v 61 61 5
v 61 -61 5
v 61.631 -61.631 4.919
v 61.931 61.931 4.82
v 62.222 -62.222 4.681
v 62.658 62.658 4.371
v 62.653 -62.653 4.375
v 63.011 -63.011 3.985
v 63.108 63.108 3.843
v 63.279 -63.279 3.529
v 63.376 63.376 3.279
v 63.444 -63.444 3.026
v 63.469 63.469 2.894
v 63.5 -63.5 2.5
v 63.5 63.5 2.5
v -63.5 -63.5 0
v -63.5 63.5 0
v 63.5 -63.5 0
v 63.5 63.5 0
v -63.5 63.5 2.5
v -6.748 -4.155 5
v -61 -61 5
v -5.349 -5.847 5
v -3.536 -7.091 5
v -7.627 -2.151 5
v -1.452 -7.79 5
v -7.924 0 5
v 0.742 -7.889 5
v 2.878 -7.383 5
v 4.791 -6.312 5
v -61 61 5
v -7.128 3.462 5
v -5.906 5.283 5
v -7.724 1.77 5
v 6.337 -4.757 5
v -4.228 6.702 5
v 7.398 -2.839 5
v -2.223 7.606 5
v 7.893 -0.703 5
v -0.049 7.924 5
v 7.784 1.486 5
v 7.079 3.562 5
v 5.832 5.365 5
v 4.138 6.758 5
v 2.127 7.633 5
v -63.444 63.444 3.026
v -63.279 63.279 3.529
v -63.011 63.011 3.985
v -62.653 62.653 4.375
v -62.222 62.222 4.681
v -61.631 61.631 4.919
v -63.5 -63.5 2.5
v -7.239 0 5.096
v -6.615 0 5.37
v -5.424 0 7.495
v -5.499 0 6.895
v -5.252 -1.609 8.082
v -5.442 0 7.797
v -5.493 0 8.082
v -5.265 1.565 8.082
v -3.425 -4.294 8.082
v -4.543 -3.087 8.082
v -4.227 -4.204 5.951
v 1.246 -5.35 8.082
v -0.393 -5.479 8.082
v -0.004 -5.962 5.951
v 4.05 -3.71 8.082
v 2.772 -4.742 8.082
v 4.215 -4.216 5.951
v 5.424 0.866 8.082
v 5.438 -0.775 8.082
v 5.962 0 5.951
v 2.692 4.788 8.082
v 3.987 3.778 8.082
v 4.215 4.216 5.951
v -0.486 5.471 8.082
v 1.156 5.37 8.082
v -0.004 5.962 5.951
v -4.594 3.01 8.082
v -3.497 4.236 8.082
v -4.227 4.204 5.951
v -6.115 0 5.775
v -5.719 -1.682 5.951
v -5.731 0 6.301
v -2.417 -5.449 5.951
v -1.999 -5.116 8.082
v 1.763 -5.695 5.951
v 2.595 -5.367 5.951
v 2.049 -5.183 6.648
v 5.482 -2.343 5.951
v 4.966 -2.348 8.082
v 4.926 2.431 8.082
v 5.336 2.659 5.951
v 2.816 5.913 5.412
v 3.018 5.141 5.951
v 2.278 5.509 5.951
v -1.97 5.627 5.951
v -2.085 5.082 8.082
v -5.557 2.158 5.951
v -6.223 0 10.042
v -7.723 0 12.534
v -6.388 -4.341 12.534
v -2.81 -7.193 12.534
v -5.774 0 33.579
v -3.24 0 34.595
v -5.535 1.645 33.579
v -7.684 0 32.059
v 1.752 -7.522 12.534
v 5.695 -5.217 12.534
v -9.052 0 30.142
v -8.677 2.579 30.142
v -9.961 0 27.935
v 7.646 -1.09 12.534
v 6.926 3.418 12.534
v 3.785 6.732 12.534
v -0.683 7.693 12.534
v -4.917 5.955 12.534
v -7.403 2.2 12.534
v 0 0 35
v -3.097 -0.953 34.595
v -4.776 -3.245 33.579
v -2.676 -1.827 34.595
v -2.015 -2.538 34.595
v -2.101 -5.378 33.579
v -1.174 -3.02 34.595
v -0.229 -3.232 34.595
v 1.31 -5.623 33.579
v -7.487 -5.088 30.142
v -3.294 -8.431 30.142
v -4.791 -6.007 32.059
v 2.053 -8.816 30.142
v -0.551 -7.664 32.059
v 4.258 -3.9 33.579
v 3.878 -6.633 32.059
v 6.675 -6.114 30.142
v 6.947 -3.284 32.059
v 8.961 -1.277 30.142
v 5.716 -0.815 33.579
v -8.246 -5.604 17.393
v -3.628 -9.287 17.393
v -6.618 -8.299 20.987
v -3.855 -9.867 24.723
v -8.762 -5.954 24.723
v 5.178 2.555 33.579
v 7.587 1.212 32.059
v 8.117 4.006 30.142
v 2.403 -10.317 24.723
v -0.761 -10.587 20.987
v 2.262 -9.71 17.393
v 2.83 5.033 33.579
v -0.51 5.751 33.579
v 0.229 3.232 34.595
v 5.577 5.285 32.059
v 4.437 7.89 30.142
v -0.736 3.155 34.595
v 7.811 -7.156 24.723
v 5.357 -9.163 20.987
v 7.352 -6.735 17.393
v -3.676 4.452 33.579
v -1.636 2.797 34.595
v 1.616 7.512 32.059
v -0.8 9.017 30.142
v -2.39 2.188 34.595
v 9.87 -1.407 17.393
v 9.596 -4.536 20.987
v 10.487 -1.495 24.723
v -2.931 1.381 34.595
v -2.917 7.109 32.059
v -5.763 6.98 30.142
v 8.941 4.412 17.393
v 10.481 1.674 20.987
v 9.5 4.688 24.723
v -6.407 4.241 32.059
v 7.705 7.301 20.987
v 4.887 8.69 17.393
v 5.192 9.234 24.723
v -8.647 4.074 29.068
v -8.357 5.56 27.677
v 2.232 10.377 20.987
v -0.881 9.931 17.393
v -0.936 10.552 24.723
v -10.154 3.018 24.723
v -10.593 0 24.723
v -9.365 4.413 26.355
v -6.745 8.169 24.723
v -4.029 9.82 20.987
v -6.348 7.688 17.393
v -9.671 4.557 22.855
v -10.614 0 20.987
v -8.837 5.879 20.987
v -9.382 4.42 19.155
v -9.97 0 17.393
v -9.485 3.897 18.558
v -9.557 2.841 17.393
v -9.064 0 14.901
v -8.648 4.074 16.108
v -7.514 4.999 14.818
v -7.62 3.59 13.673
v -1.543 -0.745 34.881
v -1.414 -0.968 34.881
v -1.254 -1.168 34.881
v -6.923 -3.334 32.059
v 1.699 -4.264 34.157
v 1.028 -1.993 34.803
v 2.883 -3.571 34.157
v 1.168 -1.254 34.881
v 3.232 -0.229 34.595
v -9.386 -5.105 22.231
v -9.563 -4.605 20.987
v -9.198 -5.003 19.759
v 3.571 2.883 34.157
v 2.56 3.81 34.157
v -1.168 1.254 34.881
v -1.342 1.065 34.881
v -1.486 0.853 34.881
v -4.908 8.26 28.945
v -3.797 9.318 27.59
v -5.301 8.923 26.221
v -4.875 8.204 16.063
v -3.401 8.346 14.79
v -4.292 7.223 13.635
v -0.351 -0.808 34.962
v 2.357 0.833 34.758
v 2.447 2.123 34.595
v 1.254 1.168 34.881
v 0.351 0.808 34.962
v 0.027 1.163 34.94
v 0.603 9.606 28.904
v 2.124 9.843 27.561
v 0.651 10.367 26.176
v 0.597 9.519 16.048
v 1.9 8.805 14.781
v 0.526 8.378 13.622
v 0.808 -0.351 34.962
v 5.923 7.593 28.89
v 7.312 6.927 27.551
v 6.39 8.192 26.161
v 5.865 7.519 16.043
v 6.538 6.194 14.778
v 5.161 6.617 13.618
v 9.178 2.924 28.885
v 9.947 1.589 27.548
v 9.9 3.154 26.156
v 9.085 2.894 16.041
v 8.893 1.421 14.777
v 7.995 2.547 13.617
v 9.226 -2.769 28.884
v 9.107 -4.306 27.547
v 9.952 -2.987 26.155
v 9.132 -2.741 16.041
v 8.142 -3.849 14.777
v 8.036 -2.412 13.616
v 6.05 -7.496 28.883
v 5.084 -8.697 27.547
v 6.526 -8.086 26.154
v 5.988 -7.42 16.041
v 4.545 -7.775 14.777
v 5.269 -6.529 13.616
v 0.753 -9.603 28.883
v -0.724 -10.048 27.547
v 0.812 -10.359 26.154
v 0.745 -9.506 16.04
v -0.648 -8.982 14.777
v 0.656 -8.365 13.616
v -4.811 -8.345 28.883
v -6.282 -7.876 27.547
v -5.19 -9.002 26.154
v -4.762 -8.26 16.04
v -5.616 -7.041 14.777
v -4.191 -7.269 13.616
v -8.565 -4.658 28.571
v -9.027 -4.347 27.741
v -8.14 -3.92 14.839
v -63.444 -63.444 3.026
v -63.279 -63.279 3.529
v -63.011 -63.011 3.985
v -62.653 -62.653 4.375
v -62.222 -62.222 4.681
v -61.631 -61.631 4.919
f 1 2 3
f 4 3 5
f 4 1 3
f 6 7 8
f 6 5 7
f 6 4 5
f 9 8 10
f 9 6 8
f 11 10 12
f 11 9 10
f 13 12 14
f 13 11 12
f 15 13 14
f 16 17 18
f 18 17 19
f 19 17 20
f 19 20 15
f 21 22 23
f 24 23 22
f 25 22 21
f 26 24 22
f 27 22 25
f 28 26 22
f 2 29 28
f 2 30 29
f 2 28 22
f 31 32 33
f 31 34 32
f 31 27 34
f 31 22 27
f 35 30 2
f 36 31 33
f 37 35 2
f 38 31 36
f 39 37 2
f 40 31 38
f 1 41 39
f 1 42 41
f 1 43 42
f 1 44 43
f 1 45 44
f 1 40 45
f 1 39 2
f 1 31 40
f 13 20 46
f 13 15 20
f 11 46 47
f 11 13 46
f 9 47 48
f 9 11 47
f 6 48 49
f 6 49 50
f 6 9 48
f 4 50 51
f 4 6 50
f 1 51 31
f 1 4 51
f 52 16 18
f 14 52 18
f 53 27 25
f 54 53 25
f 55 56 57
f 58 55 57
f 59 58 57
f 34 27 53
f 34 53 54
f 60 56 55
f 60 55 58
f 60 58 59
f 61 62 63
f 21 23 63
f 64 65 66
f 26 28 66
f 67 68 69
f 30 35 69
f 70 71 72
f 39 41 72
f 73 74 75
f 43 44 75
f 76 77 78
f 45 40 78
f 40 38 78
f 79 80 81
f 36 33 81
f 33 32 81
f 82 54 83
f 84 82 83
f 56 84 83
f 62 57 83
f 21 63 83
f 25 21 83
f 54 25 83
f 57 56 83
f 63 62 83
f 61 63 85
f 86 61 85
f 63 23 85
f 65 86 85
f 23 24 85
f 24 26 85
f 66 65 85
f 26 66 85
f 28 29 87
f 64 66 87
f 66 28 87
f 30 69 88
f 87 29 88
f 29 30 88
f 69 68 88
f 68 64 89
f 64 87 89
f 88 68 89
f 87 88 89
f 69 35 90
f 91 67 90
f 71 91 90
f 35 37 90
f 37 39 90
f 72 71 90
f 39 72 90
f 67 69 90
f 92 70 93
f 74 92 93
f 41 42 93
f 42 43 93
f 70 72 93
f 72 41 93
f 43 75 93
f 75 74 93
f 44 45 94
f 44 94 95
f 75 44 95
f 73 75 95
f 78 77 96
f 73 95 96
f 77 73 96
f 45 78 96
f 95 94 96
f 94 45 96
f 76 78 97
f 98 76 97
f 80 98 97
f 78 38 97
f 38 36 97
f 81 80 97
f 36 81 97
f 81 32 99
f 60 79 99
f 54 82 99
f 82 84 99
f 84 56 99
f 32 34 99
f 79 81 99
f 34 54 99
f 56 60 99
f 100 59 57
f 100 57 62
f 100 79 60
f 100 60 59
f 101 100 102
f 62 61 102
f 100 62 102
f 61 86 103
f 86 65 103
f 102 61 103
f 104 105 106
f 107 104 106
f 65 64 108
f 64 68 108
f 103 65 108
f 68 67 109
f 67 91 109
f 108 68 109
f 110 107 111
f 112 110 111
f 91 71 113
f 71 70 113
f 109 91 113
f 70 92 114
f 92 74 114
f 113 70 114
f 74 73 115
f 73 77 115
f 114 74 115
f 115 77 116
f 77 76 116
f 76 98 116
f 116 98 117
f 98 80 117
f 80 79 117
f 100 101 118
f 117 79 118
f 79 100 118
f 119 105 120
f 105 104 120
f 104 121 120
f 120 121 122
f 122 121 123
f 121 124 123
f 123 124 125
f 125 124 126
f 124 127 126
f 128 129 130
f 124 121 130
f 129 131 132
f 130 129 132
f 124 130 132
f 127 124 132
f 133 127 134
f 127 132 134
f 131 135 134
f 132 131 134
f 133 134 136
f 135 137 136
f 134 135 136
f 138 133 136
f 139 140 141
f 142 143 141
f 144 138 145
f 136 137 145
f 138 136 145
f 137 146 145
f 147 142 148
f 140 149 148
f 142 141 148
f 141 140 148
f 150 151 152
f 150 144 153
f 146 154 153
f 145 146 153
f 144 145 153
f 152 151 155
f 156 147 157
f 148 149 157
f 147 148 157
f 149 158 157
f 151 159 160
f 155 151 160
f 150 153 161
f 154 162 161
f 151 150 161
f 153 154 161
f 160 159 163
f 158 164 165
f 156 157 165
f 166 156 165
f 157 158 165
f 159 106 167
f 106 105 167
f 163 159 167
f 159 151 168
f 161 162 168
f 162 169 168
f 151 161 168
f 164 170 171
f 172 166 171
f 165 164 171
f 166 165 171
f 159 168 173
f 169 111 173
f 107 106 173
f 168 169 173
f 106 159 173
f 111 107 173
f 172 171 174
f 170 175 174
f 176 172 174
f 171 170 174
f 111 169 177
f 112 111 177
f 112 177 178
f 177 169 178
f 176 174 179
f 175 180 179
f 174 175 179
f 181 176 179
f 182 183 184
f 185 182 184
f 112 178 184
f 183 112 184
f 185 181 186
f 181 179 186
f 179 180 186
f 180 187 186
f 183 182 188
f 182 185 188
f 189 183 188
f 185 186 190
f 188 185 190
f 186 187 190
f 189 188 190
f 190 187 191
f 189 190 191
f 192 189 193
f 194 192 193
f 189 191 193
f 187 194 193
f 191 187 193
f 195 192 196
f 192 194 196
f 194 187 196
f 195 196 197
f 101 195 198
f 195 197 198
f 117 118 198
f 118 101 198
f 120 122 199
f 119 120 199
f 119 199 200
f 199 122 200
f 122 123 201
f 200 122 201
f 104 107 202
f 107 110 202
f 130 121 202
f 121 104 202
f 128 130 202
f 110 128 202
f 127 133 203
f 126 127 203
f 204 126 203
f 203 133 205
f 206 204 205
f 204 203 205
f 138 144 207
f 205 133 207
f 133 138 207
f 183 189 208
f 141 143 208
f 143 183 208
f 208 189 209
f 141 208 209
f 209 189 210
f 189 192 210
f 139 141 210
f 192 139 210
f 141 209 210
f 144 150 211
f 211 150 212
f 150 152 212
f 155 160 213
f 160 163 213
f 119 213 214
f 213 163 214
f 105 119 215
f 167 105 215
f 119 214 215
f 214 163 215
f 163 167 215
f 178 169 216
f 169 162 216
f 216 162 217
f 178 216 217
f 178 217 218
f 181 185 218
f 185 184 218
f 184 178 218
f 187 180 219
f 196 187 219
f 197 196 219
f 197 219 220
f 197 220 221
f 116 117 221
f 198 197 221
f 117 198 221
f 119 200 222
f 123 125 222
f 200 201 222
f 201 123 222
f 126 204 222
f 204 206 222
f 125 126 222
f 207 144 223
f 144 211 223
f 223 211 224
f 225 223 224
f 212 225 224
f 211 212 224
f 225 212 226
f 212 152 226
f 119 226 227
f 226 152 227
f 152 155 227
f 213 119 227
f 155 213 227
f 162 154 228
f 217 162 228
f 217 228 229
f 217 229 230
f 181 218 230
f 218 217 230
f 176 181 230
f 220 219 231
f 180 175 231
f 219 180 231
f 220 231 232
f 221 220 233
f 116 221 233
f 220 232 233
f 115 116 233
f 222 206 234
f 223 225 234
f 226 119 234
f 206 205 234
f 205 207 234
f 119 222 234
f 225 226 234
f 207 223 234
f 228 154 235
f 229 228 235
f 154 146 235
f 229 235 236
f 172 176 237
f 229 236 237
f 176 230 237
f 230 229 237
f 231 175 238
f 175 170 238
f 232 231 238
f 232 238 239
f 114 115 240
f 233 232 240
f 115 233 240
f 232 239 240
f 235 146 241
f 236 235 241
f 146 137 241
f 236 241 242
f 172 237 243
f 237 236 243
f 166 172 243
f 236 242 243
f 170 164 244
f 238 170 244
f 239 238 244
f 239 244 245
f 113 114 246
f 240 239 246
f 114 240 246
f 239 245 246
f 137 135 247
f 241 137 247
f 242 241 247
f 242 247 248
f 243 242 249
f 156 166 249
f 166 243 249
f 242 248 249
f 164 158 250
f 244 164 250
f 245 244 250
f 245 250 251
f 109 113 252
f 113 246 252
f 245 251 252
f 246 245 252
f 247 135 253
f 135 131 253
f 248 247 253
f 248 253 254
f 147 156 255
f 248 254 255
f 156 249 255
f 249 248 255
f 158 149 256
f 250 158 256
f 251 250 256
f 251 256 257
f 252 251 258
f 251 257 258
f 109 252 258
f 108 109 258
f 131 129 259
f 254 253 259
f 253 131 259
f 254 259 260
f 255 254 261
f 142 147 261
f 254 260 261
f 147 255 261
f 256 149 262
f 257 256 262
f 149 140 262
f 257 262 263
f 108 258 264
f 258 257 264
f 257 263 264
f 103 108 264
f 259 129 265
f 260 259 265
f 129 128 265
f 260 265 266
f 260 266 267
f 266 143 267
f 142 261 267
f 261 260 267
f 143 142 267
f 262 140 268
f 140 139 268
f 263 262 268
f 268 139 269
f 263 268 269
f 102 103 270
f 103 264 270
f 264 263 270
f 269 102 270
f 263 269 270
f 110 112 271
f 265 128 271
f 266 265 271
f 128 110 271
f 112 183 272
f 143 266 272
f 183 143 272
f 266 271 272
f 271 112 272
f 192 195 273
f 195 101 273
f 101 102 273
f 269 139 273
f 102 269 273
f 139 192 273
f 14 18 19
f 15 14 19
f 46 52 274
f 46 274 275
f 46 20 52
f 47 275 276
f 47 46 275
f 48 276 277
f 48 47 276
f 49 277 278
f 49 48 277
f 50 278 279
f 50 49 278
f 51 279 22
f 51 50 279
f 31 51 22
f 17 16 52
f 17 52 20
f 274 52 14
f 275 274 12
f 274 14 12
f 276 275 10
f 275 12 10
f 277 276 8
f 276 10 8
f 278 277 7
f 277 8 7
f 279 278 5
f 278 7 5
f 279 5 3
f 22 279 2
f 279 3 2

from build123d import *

# Parameters (mm, degrees)
F1_W     = 127
F1_H     = 127
F2_DEPTH = 5
F5_R     = 2.5


with BuildPart() as f2:
    # F1 (on Top) → F2 (new body)
    with BuildSketch(Plane.XY):
        Rectangle(F1_W, F1_H)
    extrude(amount=F2_DEPTH)

    # F3 (on Front) → F4 (revolve)
    with BuildSketch(Plane.XZ):
        with BuildLine():
            Line((-5.3333333333, 5), (0, 5))
            Line((0, 5), (0, 35))
            add(Edge.make_bspline(
                [(0, 35), (-6.5041498378, 34.8856949083), (-11.8426118801, 27.7496803572), (-10.0399512827, 13.5458032148), (-4.8367147753, 9.4293111278), (-5.3333333333, 5)],
                knots=[0, 0, 0, 0, 0.3484232949, 0.6924985169, 1, 1, 1, 1], degree=3))
        make_face()
    revolve(axis=Axis((0, 0, 20), (0, 0, 1)))

    # F5
    f5_edges = [f2.edges().sort_by_distance(p)[0] for p in [
        (0, -63.5, 5),
        (-63.5, 0, 5),
        (63.5, 0, 5),
        (0, 63.5, 5),
        (5.333333, 0, 5),
    ]]
    fillet(f5_edges, radius=F5_R)


solid = f2.part
